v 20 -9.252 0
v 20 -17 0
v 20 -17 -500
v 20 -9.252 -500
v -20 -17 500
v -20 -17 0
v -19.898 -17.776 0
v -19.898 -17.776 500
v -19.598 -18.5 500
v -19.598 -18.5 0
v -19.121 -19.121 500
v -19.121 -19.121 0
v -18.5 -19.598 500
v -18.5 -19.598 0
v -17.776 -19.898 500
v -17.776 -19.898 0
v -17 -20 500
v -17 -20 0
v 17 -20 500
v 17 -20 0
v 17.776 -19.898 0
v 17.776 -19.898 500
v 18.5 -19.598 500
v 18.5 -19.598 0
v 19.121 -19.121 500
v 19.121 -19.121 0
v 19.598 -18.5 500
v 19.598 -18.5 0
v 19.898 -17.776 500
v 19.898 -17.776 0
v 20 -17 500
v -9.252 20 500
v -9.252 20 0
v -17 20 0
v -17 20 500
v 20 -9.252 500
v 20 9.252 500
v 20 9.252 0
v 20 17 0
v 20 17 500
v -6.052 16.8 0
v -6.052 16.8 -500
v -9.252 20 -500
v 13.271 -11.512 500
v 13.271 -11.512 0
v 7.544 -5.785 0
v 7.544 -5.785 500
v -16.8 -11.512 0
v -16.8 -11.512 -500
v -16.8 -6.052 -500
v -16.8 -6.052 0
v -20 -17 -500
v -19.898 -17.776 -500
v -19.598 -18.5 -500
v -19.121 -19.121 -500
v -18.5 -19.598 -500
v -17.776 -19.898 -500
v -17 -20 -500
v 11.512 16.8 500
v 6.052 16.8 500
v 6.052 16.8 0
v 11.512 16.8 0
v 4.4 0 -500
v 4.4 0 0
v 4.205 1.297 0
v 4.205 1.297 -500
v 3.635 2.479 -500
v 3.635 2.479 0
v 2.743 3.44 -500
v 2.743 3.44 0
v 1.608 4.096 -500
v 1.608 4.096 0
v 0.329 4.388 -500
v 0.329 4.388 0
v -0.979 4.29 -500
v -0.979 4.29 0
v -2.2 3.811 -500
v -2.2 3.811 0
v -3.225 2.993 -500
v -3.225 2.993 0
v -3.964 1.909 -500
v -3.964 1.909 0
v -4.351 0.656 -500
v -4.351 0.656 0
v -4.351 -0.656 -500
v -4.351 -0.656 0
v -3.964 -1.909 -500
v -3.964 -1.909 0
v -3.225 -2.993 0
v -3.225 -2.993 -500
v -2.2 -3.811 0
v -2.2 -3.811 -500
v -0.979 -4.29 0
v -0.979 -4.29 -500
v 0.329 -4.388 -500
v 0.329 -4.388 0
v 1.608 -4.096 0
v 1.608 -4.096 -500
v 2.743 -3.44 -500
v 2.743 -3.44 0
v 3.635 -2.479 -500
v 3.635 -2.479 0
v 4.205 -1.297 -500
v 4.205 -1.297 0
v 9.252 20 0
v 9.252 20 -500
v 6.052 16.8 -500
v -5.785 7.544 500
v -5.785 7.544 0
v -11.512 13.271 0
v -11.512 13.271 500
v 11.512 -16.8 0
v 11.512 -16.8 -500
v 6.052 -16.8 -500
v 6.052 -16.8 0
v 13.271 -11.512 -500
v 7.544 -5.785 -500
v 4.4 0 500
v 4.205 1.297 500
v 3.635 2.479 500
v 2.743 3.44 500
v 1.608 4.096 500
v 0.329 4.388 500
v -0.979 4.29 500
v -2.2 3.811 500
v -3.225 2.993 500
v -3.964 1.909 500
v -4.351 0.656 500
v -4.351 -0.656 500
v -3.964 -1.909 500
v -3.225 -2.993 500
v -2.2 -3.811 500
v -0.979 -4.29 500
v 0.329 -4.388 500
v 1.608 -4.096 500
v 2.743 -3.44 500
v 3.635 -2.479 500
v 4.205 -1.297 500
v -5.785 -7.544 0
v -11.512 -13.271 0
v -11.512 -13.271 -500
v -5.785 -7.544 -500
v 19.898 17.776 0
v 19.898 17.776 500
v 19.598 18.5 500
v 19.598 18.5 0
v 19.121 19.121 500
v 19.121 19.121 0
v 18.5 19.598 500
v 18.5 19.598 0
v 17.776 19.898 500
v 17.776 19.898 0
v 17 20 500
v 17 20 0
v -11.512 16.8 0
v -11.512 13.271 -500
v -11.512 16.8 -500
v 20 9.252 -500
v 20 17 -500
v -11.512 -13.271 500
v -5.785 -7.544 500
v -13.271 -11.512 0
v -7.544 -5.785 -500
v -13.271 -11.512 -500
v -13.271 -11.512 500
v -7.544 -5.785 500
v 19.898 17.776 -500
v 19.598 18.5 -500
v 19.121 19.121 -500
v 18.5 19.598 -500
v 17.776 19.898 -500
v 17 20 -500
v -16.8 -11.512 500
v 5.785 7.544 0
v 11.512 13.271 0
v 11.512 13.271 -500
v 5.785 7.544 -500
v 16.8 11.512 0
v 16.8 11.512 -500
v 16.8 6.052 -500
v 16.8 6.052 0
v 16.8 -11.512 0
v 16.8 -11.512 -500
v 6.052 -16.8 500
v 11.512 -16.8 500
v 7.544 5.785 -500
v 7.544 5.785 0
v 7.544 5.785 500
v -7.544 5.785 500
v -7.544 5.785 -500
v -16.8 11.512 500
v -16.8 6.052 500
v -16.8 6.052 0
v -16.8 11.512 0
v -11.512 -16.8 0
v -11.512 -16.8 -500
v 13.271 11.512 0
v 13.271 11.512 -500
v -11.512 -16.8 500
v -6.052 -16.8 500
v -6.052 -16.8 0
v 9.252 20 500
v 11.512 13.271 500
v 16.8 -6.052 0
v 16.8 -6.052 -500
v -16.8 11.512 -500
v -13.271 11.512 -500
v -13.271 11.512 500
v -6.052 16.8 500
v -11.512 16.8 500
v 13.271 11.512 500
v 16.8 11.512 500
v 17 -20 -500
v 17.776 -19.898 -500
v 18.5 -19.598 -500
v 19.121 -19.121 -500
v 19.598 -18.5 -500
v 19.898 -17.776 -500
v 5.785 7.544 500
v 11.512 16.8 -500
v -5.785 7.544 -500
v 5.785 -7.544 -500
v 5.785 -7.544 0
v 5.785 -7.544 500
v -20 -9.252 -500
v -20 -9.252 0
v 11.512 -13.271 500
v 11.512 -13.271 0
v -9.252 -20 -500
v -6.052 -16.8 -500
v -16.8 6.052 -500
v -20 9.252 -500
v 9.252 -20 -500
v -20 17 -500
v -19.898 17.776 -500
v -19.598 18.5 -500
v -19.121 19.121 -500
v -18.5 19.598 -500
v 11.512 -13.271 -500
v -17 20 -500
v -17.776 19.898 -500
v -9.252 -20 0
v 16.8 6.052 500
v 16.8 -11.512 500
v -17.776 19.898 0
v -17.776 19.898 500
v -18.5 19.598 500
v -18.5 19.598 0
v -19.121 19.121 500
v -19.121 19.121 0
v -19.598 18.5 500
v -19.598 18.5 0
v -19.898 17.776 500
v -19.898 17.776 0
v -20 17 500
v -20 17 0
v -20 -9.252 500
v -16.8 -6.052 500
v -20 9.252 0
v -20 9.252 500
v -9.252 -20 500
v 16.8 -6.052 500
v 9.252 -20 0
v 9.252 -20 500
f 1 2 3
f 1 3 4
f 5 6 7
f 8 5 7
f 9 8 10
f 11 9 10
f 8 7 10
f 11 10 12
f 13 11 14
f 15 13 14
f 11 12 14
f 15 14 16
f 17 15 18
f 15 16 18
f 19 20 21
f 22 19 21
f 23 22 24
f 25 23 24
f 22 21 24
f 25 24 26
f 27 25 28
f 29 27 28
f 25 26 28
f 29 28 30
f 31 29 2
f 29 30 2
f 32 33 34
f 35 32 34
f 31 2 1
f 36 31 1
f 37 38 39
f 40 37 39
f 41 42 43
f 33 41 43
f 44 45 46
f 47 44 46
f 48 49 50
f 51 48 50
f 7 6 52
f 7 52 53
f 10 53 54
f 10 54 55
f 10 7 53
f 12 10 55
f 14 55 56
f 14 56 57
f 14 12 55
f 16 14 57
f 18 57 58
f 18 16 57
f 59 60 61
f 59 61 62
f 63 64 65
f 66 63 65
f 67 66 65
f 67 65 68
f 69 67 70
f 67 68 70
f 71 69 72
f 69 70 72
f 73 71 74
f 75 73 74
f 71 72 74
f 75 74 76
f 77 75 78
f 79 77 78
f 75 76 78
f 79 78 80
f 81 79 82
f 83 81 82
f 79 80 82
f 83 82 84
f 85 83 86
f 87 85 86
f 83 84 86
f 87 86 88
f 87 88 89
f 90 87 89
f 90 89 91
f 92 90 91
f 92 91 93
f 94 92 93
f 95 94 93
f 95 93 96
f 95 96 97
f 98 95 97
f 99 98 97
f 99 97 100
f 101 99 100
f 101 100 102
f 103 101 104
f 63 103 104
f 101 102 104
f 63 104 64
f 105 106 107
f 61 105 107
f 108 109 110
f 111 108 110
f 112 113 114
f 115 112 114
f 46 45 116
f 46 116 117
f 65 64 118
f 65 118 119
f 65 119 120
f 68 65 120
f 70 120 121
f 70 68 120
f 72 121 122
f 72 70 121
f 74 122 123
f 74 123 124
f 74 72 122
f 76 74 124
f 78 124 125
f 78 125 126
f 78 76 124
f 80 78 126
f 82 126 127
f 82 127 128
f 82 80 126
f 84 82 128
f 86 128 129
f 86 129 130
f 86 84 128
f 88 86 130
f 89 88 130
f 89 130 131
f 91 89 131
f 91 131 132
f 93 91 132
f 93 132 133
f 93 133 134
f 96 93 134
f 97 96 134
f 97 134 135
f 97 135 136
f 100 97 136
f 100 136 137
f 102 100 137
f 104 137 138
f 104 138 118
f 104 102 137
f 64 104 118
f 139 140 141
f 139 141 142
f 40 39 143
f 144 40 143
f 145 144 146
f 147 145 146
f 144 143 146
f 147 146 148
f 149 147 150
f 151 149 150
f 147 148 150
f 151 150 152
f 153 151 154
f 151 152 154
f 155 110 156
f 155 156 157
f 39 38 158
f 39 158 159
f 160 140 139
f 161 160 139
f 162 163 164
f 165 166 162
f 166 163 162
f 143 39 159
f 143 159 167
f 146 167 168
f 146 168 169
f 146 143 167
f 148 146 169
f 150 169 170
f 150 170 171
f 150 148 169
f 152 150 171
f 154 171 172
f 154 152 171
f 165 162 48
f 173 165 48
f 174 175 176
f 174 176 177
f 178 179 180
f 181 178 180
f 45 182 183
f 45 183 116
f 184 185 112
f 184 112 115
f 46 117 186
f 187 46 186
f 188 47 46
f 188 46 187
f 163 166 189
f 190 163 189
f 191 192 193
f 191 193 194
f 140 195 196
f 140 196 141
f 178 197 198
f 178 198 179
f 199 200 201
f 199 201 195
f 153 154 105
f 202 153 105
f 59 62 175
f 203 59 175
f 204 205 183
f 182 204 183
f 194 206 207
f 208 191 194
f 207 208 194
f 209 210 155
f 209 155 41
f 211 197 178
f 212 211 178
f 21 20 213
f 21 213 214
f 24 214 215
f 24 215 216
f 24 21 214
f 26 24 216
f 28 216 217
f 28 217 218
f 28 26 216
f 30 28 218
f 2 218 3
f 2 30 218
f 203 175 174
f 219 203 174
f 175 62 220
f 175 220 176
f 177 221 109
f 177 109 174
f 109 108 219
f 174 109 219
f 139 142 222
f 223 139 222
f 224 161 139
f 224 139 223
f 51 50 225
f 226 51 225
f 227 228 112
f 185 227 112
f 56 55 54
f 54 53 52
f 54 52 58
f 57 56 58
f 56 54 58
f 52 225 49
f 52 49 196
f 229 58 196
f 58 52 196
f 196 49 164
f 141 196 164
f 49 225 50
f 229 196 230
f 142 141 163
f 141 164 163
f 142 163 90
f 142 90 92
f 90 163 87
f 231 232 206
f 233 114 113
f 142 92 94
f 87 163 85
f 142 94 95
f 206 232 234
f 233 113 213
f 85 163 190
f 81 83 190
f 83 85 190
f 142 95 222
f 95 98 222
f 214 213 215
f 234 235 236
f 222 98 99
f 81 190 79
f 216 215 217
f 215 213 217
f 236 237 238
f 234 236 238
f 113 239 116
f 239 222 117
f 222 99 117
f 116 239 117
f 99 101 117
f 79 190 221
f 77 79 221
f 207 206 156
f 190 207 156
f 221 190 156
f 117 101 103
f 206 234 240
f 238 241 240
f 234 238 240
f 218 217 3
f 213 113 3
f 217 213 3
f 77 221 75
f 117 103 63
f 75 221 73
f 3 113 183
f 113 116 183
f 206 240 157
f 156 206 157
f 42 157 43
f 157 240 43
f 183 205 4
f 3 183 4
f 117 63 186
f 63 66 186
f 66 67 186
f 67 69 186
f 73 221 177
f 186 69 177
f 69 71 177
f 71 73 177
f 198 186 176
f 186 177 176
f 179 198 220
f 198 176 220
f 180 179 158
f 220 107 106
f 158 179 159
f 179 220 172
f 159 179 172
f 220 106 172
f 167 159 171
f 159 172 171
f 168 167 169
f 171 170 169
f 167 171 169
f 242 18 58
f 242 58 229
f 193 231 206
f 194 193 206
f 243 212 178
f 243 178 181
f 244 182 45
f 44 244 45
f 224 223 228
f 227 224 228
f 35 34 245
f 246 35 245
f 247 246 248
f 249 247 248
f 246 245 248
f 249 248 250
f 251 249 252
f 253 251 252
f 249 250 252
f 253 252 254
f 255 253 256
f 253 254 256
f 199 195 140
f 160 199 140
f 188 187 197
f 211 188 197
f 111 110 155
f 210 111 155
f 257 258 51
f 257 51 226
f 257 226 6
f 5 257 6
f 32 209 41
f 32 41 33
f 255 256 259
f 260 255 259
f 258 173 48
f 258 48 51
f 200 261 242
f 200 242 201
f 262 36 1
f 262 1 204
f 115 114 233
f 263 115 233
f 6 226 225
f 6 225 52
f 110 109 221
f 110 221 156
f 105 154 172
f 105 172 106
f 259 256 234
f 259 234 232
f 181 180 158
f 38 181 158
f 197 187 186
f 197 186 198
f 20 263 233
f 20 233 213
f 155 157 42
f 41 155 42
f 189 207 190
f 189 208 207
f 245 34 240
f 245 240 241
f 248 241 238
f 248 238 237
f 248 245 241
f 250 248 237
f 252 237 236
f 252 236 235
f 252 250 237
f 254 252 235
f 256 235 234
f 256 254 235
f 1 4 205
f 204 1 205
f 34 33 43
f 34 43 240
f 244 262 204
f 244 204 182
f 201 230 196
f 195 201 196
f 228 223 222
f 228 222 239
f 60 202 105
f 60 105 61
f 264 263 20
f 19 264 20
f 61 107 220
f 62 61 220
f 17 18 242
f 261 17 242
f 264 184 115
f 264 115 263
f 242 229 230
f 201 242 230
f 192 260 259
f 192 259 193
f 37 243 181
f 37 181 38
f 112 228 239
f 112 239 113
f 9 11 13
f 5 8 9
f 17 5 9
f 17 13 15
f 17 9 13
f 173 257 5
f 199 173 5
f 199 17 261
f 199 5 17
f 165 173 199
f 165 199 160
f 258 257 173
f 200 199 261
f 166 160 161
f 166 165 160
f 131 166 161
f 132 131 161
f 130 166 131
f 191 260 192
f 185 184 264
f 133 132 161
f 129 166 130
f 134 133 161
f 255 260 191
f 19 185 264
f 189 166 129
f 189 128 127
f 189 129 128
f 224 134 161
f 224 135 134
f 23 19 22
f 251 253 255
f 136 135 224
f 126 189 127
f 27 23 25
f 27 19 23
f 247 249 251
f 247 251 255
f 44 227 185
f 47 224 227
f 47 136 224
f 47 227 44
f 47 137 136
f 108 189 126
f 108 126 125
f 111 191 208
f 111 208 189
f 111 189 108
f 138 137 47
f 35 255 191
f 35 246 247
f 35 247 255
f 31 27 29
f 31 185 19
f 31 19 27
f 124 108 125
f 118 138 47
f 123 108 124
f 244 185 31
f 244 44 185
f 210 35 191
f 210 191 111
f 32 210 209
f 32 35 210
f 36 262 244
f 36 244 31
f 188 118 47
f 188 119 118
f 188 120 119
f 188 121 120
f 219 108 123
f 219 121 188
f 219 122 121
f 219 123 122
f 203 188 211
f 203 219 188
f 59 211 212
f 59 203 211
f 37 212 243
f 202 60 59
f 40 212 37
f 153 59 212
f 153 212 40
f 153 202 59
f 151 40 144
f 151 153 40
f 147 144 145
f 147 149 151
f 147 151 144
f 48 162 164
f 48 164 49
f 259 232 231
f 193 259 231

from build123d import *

# Parameters (mm, degrees)
SKETCH1_W           = 15.088
SKETCH1_H           = 15.088
SKETCH1_R           = 4.4
BOSS_EXTRUDE1_DEPTH = 500


with BuildPart() as part:
    # Sketch1 → Boss-Extrude1 (new, symmetric)
    # profile 1 of 5: a face of its own
    with BuildSketch(Plane.XY):
        with BuildLine():
            Line((-7.544, 7.544), (-5.784718328, 7.544))
            Line((-5.784718328, 7.544), (-11.512, 13.271281672))
            Line((-11.512, 13.271281672), (-11.512, 16.8))
            Line((-11.512, 16.8), (-6.051976926, 16.8))
            Line((-6.051976926, 16.8), (-9.251976926, 20))
            Line((-9.251976926, 20), (-17, 20))
            ThreePointArc((-17, 20), (-19.121320344, 19.121320344), (-20, 17))
            Line((-20, 17), (-20, 9.251976926))
            Line((-20, 9.251976926), (-16.8, 6.051976926))
            Line((-16.8, 6.051976926), (-16.8, 11.512))
            Line((-16.8, 11.512), (-13.271281672, 11.512))
            Line((-13.271281672, 11.512), (-7.544, 5.784718328))
            Line((-7.544, 5.784718328), (-7.544, 7.544))
        make_face()
    # profile 2 of 5: a face of its own
    with BuildSketch(Plane.XY):
        with BuildLine():
            Line((11.512, 13.271281672), (5.784718328, 7.544))
            Line((5.784718328, 7.544), (7.544, 7.544))
            Line((7.544, 7.544), (7.544, 5.784718328))
            Line((7.544, 5.784718328), (13.271281672, 11.512))
            Line((13.271281672, 11.512), (16.8, 11.512))
            Line((16.8, 11.512), (16.8, 6.051976926))
            Line((16.8, 6.051976926), (20, 9.251976926))
            Line((20, 9.251976926), (20, 17))
            ThreePointArc((20, 17), (19.121320344, 19.121320344), (17, 20))
            Line((17, 20), (9.251976926, 20))
            Line((9.251976926, 20), (6.051976926, 16.8))
            Line((6.051976926, 16.8), (11.512, 16.8))
            Line((11.512, 16.8), (11.512, 13.271281672))
        make_face()
    # profile 3 of 5: a face of its own
    with BuildSketch(Plane.XY):
        with BuildLine():
            Line((-7.544, -7.544), (-7.544, -5.784718328))
            Line((-7.544, -5.784718328), (-13.271281672, -11.512))
            Line((-13.271281672, -11.512), (-16.8, -11.512))
            Line((-16.8, -11.512), (-16.8, -6.051976926))
            Line((-16.8, -6.051976926), (-20, -9.251976926))
            Line((-20, -9.251976926), (-20, -17))
            ThreePointArc((-20, -17), (-19.121320344, -19.121320344), (-17, -20))
            Line((-17, -20), (-9.251976926, -20))
            Line((-9.251976926, -20), (-6.051976926, -16.8))
            Line((-6.051976926, -16.8), (-11.512, -16.8))
            Line((-11.512, -16.8), (-11.512, -13.271281672))
            Line((-11.512, -13.271281672), (-5.784718328, -7.544))
            Line((-5.784718328, -7.544), (-7.544, -7.544))
        make_face()
    # profile 4 of 5: a face of its own
    with BuildSketch(Plane.XY):
        with BuildLine():
            Line((13.271281672, -11.512), (7.544, -5.784718328))
            Line((7.544, -5.784718328), (7.544, -7.544))
            Line((7.544, -7.544), (5.784718328, -7.544))
            Line((5.784718328, -7.544), (11.512, -13.271281672))
            Line((11.512, -13.271281672), (11.512, -16.8))
            Line((11.512, -16.8), (6.051976926, -16.8))
            Line((6.051976926, -16.8), (9.251976926, -20))
            Line((9.251976926, -20), (17, -20))
            ThreePointArc((17, -20), (19.121320344, -19.121320344), (20, -17))
            Line((20, -17), (20, -9.251976926))
            Line((20, -9.251976926), (16.8, -6.051976926))
            Line((16.8, -6.051976926), (16.8, -11.512))
            Line((16.8, -11.512), (13.271281672, -11.512))
        make_face()
    # profile 5 of 5: a face of its own
    with BuildSketch(Plane.XY):
        Rectangle(SKETCH1_W, SKETCH1_H)
        Circle(SKETCH1_R, mode=Mode.SUBTRACT)
    extrude(amount=BOSS_EXTRUDE1_DEPTH, both=True)


solid = part.part
